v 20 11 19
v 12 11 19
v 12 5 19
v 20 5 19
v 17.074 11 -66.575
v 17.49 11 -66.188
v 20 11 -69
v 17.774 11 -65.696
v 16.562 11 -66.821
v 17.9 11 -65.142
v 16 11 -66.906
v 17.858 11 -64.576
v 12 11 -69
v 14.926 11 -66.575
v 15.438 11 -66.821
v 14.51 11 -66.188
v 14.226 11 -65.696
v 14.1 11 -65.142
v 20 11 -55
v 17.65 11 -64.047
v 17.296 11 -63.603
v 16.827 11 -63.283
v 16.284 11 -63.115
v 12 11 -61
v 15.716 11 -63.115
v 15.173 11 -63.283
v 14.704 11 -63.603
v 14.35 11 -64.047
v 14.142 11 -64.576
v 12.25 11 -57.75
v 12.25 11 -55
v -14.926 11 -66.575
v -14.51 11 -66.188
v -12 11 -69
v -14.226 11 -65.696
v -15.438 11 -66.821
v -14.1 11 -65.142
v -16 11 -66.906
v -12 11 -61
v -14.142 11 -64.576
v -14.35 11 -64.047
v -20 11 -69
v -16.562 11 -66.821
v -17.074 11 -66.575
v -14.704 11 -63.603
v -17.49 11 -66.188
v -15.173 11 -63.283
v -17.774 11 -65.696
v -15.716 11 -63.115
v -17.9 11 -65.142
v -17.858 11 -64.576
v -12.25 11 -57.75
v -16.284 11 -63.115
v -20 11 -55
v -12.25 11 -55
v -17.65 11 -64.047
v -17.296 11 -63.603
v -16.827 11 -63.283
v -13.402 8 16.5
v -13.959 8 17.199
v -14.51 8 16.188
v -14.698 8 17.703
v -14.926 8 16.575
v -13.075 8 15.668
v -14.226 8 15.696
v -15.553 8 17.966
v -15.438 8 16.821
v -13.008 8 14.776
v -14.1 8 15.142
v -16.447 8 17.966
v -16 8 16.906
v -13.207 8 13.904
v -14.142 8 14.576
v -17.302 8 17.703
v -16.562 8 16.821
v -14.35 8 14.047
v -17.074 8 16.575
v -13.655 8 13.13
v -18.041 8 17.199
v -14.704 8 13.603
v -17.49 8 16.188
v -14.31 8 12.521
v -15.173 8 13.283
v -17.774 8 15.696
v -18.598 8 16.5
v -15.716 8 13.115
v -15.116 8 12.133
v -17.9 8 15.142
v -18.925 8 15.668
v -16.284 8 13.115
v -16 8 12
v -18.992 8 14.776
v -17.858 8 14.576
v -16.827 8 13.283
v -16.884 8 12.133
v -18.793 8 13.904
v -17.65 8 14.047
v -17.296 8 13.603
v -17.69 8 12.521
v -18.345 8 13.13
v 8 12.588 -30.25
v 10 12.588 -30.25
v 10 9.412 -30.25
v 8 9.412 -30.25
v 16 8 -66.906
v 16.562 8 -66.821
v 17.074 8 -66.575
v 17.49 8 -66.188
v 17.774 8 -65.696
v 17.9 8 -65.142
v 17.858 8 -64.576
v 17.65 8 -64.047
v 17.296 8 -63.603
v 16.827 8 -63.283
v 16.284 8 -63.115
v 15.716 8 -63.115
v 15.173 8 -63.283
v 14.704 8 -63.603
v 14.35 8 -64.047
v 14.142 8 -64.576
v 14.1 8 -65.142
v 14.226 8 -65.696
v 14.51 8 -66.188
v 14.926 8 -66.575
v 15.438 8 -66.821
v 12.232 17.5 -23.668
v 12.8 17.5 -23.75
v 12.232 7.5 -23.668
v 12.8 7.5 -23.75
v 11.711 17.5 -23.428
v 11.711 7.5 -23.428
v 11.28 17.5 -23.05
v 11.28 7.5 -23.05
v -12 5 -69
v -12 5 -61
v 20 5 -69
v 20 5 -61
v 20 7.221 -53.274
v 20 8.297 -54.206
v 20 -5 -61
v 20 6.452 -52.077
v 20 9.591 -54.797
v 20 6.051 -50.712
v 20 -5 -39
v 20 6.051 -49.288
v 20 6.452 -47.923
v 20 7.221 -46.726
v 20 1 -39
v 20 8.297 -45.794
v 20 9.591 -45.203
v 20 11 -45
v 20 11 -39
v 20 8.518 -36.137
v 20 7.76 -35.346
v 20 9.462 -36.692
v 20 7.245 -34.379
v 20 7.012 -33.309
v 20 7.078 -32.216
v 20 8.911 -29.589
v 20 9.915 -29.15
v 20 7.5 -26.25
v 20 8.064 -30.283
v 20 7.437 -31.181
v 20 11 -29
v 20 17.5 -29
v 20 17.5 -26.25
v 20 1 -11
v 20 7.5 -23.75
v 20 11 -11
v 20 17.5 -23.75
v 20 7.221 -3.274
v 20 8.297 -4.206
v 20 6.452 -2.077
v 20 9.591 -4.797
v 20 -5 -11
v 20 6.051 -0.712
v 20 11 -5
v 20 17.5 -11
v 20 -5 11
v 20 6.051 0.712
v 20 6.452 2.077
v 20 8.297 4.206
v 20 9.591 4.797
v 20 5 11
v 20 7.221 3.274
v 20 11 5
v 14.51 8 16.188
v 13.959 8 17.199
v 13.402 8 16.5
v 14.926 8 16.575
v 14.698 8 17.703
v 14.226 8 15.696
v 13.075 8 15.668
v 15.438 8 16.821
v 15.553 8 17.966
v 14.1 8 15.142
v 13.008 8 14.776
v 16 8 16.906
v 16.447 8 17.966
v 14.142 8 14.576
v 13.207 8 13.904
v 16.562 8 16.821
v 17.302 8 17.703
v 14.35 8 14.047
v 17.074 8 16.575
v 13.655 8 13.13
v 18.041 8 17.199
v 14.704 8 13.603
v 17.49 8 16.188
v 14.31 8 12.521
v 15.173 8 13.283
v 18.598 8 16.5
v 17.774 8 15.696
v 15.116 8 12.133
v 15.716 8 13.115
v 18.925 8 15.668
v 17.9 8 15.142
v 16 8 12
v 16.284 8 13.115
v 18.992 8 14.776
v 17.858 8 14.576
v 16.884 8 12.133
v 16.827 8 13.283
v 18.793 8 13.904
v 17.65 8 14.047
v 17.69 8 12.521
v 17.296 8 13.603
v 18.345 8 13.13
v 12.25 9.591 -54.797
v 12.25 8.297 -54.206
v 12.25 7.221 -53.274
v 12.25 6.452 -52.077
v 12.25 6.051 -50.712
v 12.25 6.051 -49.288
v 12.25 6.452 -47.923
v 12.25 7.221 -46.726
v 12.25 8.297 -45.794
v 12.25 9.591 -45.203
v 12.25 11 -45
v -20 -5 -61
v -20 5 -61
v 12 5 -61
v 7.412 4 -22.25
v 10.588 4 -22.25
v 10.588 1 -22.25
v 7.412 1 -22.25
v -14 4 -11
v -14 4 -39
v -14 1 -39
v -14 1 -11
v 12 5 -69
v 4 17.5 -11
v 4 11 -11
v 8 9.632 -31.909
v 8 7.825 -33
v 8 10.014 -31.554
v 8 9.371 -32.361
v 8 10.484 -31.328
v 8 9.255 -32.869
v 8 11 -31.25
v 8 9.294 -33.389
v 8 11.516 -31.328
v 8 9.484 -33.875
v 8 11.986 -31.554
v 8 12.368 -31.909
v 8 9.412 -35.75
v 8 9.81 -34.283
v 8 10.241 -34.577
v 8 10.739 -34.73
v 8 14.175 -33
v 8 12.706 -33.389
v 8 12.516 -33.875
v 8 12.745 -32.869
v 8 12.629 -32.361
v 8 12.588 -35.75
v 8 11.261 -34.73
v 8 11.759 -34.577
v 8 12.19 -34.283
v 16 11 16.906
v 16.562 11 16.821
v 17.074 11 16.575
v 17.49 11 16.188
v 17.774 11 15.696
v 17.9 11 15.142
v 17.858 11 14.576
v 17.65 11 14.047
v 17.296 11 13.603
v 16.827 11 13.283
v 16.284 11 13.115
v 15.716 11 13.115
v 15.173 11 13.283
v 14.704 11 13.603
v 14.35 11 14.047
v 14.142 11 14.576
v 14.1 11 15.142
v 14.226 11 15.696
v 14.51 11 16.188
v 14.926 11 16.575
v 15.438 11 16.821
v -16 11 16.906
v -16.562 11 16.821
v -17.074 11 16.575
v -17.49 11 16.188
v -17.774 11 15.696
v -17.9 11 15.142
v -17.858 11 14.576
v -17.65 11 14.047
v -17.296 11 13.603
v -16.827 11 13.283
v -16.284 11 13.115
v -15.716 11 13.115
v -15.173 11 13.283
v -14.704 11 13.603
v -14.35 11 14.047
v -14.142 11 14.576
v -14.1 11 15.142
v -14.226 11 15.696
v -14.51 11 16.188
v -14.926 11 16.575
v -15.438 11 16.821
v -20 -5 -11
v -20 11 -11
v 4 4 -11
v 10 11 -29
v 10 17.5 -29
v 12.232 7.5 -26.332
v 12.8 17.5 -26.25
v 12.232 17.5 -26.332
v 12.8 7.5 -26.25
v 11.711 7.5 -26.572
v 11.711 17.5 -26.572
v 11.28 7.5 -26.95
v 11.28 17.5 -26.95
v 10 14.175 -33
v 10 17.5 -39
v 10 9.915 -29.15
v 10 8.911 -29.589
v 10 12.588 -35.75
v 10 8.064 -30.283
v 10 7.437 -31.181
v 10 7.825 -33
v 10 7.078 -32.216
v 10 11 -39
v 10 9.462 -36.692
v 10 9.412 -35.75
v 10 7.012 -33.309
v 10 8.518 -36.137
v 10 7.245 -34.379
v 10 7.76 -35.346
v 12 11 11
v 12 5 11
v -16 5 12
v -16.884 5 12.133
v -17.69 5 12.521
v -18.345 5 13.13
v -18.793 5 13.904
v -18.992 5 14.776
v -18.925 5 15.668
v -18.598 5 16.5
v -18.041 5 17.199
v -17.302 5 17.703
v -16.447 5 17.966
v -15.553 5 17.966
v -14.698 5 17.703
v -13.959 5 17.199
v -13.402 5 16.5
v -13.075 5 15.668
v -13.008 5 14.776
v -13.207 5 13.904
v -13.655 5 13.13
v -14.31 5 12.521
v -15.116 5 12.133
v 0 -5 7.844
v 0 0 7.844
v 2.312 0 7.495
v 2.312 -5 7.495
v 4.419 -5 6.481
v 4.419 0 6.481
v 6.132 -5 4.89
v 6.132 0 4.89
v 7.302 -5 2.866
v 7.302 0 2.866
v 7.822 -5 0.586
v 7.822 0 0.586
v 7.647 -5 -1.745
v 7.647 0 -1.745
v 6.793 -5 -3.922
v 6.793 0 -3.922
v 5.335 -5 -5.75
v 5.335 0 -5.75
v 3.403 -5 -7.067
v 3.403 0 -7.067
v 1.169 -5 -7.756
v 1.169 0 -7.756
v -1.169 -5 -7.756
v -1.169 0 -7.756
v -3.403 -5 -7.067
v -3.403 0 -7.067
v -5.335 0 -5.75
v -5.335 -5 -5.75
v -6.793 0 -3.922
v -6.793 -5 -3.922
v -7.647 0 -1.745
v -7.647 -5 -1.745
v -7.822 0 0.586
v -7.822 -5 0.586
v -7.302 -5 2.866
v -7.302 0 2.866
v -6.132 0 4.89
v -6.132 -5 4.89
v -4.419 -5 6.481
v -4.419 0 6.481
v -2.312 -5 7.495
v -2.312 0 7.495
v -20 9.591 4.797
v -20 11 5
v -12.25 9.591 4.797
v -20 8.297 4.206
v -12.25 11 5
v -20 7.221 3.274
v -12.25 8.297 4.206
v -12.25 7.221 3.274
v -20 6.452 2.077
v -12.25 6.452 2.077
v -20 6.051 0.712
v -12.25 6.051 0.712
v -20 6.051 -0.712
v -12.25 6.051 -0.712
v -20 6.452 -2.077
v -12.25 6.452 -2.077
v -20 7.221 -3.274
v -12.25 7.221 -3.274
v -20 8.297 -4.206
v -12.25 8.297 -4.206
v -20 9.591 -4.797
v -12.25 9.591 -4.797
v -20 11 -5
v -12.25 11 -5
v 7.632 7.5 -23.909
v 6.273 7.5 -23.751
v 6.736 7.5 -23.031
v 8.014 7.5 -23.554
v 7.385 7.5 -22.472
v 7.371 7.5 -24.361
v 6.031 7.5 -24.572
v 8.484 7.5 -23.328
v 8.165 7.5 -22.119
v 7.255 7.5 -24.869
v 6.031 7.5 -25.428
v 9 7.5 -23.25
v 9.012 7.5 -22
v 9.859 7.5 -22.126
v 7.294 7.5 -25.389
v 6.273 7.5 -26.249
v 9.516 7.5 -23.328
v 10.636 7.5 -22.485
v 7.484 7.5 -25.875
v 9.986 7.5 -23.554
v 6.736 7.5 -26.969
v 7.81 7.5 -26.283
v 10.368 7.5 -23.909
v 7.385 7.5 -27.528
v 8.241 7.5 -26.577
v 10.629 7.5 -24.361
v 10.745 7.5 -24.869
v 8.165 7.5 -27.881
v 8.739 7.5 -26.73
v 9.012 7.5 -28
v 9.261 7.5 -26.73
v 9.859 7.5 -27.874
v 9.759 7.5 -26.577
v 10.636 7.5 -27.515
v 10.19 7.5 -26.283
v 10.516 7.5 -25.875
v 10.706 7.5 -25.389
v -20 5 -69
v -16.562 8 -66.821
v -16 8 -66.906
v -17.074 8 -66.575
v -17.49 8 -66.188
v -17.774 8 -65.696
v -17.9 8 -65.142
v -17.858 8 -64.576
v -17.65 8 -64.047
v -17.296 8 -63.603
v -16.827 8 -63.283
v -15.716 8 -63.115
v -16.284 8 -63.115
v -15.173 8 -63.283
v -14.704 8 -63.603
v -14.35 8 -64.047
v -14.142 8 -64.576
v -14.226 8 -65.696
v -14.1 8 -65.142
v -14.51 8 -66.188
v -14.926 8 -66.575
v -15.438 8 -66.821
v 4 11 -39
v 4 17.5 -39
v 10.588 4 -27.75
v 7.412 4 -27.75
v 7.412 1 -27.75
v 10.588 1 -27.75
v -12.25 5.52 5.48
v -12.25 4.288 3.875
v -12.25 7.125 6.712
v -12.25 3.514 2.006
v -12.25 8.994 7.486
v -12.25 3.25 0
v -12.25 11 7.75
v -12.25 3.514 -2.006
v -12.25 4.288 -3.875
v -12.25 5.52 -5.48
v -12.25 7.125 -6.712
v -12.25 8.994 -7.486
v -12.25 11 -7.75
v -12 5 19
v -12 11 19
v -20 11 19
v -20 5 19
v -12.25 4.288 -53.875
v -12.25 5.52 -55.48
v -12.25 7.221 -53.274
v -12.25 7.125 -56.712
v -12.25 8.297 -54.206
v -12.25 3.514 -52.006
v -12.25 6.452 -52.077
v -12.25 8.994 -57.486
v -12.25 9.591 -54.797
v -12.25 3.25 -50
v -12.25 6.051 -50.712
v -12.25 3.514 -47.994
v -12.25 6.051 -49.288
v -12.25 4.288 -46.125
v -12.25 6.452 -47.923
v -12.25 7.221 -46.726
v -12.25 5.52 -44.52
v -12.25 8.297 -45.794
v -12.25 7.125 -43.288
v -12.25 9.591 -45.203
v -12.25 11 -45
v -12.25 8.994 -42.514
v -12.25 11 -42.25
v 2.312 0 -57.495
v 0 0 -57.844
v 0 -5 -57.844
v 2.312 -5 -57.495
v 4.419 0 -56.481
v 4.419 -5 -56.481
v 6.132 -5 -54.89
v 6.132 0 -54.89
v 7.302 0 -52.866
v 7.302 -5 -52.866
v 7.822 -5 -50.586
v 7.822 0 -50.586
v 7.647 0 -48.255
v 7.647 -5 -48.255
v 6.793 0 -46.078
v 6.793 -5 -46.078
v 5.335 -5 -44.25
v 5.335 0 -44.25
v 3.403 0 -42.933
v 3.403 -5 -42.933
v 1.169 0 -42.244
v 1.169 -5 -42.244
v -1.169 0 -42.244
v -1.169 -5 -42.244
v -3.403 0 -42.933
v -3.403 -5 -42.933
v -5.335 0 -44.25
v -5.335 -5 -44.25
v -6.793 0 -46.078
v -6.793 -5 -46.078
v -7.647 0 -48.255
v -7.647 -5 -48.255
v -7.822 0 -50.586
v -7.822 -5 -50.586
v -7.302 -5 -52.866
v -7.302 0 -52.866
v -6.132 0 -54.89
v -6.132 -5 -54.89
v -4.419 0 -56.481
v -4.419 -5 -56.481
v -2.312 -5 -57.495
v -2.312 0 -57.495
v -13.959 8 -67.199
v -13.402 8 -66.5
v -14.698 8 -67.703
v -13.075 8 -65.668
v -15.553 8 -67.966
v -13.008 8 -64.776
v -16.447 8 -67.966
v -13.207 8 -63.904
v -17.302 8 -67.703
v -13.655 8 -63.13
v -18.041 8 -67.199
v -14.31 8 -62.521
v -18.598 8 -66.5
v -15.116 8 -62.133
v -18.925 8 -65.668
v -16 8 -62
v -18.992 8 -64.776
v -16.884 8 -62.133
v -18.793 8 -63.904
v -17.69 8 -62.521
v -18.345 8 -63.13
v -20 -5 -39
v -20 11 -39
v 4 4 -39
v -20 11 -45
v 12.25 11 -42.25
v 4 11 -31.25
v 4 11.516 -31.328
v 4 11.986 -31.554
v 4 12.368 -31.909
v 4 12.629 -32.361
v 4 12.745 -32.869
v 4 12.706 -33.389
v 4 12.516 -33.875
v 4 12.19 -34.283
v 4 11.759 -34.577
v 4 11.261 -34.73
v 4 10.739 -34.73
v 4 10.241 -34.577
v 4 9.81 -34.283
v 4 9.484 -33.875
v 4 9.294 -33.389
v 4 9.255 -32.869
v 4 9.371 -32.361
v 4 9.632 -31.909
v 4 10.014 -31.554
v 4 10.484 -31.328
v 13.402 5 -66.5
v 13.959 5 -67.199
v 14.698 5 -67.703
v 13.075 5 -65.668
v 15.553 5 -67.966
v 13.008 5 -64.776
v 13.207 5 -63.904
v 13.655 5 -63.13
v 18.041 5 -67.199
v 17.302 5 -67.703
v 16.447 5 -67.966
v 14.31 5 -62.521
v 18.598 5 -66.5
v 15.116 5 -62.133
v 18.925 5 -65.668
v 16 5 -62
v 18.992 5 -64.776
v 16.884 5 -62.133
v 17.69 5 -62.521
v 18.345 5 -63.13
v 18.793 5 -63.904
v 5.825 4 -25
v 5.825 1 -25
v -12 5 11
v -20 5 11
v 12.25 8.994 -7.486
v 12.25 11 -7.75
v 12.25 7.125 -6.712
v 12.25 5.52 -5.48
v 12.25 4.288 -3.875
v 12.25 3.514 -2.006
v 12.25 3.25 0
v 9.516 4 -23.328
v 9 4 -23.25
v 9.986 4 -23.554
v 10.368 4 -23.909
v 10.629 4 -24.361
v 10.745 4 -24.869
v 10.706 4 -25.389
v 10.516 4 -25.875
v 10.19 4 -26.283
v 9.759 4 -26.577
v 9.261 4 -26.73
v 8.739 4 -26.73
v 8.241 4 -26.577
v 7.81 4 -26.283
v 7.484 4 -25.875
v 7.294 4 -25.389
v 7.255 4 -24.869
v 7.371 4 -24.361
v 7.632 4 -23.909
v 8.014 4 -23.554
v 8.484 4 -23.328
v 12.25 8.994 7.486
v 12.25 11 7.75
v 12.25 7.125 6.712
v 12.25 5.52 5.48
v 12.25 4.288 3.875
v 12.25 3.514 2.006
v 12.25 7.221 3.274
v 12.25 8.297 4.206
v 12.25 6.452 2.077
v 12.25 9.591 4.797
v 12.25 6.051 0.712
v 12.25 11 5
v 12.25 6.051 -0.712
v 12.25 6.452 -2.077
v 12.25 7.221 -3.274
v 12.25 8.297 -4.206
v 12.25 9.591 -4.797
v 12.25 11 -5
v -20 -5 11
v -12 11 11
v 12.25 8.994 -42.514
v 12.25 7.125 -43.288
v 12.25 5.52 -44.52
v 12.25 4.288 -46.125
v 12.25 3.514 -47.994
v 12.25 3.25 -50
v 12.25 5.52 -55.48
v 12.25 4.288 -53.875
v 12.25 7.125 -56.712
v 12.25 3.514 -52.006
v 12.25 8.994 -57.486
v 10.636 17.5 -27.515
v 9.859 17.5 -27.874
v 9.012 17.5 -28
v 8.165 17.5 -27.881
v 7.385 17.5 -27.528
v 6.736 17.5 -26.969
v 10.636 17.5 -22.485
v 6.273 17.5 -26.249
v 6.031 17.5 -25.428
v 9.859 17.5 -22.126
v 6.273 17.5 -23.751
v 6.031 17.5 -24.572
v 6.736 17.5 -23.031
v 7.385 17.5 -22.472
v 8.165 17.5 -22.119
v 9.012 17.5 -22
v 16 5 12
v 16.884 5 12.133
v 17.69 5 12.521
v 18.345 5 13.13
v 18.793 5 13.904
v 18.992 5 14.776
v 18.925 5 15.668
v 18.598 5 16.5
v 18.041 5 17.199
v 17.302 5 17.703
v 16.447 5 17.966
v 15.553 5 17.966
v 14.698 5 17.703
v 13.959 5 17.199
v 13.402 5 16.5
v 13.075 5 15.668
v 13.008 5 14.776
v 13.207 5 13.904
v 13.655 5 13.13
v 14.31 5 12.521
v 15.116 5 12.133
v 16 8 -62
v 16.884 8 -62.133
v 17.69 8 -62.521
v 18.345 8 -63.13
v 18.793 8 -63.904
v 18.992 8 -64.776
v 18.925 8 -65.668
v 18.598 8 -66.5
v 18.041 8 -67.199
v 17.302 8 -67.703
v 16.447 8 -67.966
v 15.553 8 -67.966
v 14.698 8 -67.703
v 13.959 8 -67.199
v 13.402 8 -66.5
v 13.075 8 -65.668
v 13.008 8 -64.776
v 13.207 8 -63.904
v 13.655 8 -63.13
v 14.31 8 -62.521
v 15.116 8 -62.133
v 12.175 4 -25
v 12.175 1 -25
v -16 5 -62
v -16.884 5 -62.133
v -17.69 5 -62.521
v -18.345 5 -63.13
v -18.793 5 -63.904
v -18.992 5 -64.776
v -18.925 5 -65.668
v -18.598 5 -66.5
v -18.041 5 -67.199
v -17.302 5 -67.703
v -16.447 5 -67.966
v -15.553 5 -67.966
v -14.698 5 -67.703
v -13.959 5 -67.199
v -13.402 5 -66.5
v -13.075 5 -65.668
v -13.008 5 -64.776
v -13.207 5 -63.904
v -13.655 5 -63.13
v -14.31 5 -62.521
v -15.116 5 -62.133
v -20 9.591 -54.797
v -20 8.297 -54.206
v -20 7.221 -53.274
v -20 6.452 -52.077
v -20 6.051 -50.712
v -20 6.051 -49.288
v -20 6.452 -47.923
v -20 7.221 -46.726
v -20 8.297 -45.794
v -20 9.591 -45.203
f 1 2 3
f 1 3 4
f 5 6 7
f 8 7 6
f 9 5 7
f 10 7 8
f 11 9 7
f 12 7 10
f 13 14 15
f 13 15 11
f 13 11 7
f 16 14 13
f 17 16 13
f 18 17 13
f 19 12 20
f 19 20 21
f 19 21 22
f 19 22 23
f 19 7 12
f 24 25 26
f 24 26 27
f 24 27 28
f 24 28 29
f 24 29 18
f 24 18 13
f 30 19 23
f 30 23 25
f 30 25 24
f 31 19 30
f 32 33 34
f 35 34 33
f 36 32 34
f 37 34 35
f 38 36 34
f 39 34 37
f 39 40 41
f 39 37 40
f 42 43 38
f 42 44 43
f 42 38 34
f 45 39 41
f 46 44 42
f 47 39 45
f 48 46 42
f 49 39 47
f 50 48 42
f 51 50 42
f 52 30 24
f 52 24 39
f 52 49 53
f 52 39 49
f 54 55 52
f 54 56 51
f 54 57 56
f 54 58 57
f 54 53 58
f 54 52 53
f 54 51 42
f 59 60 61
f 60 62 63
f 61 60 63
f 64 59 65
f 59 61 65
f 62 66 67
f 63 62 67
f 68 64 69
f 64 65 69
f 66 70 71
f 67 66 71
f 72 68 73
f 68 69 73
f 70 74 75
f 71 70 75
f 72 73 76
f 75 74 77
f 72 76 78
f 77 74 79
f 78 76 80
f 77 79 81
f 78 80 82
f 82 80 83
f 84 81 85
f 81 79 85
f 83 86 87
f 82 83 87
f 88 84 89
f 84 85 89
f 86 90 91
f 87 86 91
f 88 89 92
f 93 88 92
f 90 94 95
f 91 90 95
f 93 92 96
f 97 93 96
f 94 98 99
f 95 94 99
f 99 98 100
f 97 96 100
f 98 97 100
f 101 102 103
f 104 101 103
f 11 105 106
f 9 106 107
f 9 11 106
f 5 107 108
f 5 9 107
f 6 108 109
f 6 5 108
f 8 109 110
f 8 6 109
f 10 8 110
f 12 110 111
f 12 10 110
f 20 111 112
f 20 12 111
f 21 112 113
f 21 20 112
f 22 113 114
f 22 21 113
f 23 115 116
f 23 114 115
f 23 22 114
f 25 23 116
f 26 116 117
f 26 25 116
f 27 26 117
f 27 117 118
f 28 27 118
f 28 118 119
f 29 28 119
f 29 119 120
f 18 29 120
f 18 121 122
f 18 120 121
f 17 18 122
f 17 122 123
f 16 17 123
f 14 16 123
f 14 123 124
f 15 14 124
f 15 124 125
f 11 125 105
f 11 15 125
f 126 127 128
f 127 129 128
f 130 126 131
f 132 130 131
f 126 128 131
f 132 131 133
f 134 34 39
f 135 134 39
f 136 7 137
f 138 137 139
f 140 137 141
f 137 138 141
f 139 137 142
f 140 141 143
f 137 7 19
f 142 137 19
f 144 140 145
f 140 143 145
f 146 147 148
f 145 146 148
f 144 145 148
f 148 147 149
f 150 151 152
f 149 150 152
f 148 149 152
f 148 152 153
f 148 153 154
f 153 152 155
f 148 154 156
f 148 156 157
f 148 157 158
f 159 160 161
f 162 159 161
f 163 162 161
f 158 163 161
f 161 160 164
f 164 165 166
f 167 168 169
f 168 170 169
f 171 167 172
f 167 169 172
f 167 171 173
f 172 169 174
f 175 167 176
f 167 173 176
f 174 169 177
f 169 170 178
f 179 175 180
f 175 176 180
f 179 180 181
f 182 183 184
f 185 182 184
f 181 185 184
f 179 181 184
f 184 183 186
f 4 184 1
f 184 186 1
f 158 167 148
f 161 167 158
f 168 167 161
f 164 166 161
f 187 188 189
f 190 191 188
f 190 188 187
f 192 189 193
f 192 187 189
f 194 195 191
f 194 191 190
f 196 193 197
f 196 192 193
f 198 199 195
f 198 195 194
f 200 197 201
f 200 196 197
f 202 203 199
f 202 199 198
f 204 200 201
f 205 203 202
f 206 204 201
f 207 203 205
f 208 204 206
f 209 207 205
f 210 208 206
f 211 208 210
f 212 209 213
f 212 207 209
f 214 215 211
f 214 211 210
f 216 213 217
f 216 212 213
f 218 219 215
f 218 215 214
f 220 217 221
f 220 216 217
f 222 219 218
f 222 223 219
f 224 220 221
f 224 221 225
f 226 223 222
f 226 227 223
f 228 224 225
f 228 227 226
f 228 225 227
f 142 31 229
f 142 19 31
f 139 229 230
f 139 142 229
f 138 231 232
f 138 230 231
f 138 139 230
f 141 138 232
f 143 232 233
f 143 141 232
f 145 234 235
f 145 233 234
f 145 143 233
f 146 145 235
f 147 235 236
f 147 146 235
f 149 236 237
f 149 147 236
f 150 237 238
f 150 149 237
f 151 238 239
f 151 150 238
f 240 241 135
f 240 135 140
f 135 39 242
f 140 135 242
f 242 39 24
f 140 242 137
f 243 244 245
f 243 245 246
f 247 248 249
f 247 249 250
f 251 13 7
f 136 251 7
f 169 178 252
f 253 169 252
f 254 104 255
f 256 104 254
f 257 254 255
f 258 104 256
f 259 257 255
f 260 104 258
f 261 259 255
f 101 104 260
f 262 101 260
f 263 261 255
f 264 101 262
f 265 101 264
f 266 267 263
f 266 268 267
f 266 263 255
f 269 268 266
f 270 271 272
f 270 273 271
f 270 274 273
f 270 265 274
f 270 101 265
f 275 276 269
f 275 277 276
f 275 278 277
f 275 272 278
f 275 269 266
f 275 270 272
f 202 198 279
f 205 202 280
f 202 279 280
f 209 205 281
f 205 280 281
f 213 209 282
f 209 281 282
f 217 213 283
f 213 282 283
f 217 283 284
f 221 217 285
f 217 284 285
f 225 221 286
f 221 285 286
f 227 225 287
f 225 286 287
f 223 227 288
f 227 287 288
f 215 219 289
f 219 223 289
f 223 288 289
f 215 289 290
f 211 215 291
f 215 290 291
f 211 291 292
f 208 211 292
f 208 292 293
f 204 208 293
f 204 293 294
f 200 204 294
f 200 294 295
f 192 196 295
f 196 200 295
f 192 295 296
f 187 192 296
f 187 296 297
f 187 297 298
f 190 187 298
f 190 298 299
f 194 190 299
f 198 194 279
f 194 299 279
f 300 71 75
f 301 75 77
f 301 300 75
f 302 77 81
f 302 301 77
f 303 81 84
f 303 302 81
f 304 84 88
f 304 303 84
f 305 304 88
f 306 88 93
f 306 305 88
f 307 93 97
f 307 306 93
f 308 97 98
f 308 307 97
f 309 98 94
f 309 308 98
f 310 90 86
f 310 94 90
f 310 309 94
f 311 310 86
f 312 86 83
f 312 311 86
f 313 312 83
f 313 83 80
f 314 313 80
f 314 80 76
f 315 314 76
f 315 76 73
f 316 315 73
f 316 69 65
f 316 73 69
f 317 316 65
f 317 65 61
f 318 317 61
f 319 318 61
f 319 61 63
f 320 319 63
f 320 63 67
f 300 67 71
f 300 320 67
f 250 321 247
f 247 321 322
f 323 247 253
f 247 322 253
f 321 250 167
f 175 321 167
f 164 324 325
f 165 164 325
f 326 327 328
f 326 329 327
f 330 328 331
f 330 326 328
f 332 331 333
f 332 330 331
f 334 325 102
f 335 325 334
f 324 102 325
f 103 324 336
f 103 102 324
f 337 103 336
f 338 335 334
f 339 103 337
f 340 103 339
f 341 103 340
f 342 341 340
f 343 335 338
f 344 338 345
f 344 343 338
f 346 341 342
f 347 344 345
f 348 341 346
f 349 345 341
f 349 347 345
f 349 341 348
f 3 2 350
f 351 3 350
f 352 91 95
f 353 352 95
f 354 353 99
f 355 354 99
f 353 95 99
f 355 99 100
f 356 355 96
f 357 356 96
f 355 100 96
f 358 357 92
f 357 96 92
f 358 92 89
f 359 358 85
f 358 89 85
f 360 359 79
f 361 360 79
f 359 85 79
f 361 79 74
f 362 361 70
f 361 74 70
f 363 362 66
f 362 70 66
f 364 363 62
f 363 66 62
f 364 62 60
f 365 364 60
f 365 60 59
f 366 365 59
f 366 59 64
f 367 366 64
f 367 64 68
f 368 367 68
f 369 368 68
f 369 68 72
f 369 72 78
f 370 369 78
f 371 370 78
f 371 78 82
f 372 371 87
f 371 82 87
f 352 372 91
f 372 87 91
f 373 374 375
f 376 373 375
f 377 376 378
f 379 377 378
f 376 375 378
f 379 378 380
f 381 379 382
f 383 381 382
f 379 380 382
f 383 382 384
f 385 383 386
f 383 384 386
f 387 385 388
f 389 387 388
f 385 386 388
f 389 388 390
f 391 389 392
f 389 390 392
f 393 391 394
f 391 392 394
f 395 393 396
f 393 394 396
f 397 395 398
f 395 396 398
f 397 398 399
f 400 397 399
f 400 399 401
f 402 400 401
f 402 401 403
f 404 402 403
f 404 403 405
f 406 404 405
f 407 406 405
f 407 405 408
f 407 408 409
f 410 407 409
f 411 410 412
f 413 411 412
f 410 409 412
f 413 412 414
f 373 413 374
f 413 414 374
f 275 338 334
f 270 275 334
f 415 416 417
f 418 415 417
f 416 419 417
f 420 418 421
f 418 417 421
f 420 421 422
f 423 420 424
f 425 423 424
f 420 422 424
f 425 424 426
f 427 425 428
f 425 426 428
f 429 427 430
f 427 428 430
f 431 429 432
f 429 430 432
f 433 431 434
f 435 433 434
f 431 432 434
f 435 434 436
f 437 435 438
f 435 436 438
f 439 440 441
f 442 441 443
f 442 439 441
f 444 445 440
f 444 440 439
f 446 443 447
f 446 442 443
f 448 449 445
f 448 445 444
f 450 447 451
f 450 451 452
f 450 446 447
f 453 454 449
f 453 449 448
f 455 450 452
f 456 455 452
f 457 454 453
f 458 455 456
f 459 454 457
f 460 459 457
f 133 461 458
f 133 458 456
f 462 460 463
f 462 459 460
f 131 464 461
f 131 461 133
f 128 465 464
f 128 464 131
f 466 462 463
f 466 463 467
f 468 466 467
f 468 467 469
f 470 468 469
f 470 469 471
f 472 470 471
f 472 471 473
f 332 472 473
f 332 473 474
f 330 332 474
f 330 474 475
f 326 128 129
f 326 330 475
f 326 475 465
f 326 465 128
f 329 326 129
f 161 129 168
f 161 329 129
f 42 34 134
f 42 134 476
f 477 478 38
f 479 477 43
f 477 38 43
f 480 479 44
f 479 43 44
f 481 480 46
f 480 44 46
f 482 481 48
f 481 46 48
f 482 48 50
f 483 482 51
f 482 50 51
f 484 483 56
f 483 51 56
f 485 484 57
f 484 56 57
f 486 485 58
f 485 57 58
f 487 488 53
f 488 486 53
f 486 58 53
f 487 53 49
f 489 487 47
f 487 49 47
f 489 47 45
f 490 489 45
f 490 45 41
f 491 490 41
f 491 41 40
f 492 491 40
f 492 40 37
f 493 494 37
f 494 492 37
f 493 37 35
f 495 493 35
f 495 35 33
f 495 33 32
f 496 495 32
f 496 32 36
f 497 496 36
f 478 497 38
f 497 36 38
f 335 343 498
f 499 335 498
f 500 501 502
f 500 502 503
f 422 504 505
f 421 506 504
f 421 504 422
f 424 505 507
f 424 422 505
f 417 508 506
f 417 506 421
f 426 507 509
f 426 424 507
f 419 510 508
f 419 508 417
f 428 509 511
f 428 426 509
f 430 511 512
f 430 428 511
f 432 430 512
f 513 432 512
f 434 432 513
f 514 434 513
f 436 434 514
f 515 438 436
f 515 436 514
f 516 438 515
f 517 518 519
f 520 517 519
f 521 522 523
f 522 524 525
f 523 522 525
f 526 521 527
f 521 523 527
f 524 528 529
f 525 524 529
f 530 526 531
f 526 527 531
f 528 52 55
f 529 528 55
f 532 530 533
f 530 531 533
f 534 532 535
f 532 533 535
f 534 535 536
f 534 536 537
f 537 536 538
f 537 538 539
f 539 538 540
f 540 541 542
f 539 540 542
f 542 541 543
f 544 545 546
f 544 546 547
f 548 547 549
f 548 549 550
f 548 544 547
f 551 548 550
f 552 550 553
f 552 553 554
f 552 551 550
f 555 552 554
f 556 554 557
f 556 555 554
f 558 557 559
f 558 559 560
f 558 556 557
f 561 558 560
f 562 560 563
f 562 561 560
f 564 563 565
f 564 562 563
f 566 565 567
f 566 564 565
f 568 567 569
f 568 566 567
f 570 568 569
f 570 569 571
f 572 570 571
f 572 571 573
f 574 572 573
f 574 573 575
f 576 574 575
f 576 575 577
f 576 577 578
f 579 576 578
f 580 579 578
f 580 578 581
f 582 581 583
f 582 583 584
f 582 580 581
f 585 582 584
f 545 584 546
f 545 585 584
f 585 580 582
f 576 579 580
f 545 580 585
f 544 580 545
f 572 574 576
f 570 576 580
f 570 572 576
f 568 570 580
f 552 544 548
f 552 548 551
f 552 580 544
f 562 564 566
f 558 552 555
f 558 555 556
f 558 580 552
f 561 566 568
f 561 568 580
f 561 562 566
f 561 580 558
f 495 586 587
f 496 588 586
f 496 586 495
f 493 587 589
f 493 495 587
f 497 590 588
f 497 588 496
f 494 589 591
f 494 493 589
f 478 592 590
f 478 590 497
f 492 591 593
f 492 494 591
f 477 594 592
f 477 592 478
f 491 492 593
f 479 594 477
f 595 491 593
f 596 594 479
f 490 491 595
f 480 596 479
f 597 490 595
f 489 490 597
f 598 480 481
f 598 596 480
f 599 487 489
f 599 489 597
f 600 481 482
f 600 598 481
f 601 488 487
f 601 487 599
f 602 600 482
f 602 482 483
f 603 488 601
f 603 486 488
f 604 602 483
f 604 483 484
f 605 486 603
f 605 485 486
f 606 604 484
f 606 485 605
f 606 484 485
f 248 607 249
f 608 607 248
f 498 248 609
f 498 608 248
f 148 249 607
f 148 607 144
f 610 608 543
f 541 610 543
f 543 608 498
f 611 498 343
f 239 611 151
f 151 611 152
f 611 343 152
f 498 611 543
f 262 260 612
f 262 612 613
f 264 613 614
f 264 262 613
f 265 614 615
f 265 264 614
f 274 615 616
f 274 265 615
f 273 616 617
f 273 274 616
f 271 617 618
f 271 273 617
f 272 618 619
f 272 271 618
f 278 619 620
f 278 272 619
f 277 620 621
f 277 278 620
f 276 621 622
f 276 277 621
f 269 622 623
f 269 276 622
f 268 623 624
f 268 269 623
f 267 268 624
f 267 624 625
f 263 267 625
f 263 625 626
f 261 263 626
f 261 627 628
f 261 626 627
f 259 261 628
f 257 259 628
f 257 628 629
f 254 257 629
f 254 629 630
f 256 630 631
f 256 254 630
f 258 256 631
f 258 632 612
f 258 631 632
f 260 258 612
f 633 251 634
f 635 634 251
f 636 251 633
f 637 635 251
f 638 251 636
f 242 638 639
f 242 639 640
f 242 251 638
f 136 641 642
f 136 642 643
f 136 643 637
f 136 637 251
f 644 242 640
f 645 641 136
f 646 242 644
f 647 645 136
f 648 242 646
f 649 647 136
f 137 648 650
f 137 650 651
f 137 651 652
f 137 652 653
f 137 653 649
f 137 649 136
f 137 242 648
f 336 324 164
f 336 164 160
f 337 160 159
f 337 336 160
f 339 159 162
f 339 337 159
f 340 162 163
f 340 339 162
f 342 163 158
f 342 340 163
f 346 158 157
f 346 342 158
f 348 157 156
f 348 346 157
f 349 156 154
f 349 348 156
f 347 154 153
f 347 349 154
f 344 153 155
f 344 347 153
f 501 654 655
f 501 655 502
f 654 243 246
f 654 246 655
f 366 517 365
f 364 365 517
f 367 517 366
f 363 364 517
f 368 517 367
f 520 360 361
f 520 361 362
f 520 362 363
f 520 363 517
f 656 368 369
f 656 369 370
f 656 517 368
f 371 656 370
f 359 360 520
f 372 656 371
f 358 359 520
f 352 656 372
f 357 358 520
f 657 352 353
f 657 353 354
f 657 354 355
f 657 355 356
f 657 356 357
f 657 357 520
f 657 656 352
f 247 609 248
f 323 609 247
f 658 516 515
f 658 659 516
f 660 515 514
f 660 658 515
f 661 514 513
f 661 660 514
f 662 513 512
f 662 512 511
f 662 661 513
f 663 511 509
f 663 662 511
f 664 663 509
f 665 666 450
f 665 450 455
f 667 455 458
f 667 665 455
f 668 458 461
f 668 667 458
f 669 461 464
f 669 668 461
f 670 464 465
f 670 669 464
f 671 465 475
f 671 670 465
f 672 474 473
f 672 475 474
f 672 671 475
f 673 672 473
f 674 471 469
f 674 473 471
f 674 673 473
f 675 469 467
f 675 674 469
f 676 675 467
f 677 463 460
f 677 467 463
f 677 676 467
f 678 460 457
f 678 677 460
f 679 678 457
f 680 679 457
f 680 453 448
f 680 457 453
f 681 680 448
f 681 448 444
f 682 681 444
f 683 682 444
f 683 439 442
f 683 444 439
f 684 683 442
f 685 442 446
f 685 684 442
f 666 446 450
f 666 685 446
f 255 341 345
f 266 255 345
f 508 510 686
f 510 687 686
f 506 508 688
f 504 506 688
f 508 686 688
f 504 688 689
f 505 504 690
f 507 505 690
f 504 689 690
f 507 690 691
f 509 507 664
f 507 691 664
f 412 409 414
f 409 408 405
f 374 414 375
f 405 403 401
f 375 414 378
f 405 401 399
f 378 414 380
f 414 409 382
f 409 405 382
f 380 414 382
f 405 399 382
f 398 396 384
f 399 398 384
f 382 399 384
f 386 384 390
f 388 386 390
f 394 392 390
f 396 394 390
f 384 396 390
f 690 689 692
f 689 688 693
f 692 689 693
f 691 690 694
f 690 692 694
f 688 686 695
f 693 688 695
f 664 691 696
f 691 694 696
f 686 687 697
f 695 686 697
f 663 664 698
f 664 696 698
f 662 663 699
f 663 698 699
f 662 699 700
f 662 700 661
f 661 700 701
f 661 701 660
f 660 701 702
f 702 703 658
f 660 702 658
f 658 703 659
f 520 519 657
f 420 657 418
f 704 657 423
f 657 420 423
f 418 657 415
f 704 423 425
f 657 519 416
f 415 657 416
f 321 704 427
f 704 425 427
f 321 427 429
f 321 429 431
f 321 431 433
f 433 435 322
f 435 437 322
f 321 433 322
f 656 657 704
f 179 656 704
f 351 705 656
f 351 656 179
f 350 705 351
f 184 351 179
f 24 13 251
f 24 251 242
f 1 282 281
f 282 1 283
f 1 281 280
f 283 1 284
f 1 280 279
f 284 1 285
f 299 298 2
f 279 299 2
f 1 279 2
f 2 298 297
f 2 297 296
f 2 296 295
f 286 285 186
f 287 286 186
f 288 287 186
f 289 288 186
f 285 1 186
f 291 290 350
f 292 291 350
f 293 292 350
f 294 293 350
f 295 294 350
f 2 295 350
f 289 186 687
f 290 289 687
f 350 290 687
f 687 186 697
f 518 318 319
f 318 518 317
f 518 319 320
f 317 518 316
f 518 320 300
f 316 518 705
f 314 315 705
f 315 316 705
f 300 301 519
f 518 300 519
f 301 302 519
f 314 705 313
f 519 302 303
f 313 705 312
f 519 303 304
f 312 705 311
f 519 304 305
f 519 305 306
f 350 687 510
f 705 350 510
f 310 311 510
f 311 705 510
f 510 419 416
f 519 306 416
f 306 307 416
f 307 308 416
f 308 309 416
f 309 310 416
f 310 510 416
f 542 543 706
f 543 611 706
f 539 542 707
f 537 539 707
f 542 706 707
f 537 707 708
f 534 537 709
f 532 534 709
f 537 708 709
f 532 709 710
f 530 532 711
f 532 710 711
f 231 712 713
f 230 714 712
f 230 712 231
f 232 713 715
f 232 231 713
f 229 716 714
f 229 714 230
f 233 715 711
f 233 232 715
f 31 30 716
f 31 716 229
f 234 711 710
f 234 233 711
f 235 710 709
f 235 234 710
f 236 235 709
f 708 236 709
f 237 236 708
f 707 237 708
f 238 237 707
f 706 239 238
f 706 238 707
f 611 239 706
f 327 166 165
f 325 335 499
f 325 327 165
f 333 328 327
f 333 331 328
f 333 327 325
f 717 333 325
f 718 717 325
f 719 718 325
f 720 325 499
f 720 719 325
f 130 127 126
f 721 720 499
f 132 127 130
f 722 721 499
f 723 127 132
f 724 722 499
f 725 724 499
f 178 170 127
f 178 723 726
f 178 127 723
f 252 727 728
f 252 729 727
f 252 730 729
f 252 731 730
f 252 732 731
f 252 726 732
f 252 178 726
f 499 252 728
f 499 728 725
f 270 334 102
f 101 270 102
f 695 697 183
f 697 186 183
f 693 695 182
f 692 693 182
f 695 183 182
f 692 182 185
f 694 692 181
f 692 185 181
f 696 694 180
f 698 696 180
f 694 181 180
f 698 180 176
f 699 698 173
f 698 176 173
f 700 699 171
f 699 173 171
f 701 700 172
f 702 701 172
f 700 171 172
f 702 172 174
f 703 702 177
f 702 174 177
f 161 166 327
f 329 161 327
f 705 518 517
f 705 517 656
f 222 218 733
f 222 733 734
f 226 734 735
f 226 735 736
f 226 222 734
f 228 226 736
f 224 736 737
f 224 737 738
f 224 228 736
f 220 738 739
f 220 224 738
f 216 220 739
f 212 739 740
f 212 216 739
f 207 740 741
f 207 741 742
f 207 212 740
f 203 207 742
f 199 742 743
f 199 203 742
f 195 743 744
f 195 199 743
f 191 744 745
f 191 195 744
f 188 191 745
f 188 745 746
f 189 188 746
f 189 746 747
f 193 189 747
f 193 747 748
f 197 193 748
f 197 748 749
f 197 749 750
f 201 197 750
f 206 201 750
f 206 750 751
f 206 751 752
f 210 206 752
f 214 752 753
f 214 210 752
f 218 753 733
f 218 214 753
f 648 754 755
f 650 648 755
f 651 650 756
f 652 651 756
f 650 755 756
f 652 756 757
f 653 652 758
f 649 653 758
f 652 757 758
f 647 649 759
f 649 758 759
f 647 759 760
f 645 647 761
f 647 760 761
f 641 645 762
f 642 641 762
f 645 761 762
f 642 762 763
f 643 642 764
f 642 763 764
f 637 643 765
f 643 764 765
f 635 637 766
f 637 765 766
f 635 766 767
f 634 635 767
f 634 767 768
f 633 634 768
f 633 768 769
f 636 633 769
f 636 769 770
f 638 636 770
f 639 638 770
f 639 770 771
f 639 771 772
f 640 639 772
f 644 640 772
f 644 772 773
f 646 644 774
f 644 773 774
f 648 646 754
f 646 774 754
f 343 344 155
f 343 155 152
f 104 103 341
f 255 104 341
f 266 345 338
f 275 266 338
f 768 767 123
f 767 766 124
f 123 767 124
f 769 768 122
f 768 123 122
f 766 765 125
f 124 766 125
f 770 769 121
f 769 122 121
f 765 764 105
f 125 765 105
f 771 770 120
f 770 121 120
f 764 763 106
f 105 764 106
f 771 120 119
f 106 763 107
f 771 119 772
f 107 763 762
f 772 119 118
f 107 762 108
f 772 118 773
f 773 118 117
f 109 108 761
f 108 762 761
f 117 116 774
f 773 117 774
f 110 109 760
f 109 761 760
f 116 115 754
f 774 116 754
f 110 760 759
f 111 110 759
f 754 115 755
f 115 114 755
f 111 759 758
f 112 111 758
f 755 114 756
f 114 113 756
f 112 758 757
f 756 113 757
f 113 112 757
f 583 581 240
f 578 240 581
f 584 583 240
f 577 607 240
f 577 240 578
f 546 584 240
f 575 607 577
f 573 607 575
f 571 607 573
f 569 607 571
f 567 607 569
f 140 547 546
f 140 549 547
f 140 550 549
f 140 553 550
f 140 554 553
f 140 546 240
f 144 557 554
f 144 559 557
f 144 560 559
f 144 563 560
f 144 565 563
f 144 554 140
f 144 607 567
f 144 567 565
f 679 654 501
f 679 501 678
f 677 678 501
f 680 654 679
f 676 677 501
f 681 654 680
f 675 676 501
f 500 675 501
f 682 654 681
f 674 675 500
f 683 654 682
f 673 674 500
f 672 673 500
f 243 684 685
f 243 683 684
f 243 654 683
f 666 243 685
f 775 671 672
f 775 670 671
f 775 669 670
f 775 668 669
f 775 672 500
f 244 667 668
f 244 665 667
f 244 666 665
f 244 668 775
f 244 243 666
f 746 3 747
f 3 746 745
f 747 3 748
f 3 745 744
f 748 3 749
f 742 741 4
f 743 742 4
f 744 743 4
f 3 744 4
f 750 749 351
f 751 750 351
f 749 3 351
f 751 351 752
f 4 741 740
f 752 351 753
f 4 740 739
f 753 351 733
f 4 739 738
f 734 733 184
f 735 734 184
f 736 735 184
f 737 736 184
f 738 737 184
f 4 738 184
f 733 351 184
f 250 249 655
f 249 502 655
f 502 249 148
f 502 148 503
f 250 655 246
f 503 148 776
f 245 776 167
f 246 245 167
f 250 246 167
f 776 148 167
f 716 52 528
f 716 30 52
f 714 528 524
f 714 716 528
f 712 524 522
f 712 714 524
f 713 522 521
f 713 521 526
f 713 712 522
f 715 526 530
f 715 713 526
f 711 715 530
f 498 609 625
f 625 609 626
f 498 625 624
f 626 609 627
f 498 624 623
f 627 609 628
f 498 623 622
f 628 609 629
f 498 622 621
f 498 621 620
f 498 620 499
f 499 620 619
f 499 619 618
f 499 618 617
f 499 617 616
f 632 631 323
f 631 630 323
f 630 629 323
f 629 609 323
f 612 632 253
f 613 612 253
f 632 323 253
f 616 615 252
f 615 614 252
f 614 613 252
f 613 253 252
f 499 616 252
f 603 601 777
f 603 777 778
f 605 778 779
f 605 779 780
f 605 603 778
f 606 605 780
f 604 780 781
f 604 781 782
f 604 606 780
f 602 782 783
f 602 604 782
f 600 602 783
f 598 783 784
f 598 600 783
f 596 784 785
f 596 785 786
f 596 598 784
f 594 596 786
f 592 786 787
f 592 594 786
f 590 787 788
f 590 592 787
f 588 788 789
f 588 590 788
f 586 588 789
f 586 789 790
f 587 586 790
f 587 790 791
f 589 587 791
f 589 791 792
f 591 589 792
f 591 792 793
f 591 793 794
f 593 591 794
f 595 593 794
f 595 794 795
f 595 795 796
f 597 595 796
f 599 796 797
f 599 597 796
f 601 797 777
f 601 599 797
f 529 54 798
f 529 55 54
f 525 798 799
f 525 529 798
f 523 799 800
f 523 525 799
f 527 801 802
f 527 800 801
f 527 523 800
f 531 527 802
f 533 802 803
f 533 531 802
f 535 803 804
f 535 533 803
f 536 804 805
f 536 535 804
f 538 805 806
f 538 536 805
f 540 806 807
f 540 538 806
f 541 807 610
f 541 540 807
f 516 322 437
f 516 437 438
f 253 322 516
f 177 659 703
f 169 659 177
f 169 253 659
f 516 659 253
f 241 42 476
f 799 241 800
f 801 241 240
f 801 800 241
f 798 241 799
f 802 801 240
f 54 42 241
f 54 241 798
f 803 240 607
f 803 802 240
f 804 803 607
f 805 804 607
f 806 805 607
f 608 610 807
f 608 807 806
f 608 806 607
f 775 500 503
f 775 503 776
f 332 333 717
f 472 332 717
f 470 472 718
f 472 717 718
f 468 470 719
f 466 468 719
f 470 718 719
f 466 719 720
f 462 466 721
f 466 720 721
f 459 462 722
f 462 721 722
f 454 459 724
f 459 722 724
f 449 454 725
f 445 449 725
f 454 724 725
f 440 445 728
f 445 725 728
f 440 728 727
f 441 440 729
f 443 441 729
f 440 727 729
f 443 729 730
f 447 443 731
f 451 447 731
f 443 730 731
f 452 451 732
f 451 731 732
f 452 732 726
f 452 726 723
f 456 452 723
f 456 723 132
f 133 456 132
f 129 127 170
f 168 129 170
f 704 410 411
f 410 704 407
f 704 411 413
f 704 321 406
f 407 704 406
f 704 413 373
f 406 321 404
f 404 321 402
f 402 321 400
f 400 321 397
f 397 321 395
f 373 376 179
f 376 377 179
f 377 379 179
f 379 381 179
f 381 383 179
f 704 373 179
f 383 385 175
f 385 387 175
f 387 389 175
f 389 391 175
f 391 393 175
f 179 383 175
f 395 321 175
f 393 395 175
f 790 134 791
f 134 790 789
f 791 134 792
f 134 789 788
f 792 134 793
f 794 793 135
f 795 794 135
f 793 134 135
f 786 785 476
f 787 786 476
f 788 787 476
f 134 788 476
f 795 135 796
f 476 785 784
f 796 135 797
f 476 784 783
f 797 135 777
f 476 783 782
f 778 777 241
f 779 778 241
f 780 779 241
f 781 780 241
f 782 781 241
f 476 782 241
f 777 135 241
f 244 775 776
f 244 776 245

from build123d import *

# Parameters (mm, degrees)
SKETCH1_W                  = 40
SKETCH1_H                  = 22
BOSS_EXTRUDE1_DEPTH        = 11
SKETCH2_W                  = 40
SKETCH2_H                  = 22
SKETCH2_R                  = 7.843750423
BOSS_EXTRUDE2_DEPTH        = 5
SKETCH3_W                  = 24.5
SKETCH3_H                  = 15.5
CUT_EXTRUDE1_DEPTH         = 7.75
FILLET1_R                  = 7.75
SKETCH4_R                  = 5
CUT_EXTRUDE2_DEPTH         = 36.805900352
SKETCH5_W                  = 8
SKETCH5_H                  = 8
SKETCH5_R                  = 1.905800151
BOSS_EXTRUDE3_DEPTH        = 6
CUT_EXTRUDE3_START         = -3
SKETCH6_R                  = 3
SKETCH6_R_2                = 1.905800151
CUT_EXTRUDE3_DEPTH         = 3
SKETCH7_W                  = 16
SKETCH7_H                  = 16.5
BOSS_EXTRUDE5_DEPTH        = 28
MIRROR14_COPY_1_SKETCH_W   = 8
MIRROR14_COPY_1_SKETCH_H   = 8
MIRROR14_COPY_1_SKETCH_R   = 1.905800151
MIRROR14_COPY_1_DEPTH      = 6
MIRROR14_START             = -3
MIRROR14_COPY_2_SKETCH_R   = 3
MIRROR14_COPY_2_SKETCH_R_2 = 1.905800151
MIRROR14_COPY_2_DEPTH      = 3
FILLET1_OF_MIRROR14_R      = 7.75
SKETCH9_W                  = 28
SKETCH9_H                  = 3
BOSS_EXTRUDE6_DEPTH        = 18
CUT_EXTRUDE4_DEPTH         = 10
CUT_EXTRUDE5_DEPTH         = 73.919476136
CUT_EXTRUDE5_DEPTH_BACK    = 73.919476136
SKETCH11_R                 = 1.75
CUT_EXTRUDE6_DEPTH         = 76.121568141
CUT_EXTRUDE6_DEPTH_BACK    = 76.121568141
SKETCH12_R                 = 1.75
CUT_EXTRUDE9_DEPTH         = 12
CUT_EXTRUDE11_START        = -10
SKETCH16_R                 = 4
SKETCH16_R_2               = 1.75
SKETCH16_W                 = 10
SKETCH16_H                 = 6.5
CUT_EXTRUDE11_DEPTH        = 10
FILLET2_R                  = 2
CUT_EXTRUDE12_START        = -3
SKETCH17_R                 = 1.75
CUT_EXTRUDE12_DEPTH        = 3


# Some blends are built 0.0001 mm under size
with BuildPart() as part:
    # Sketch1 → Boss-Extrude1 (new body)
    with BuildSketch(Plane(origin=(0, 0, 0), x_dir=(1, 0, 0), z_dir=(0, 1, 0))):
        Rectangle(SKETCH1_W, SKETCH1_H)
    boss_extrude1 = extrude(amount=BOSS_EXTRUDE1_DEPTH)

    # Sketch2 → Boss-Extrude2 (add)
    with BuildSketch(Plane(origin=(0, 0, 0), x_dir=(1, 0, 0), z_dir=(0, 1, 0))):
        Rectangle(SKETCH2_W, SKETCH2_H)
        with Locations(Location((0, 0, 0), (0, 0, 270))):
            Circle(SKETCH2_R, mode=Mode.SUBTRACT)
    boss_extrude2 = extrude(amount=-BOSS_EXTRUDE2_DEPTH)

    # Sketch3 → Cut-Extrude1 (cut)
    with BuildSketch(Plane(origin=(0, 11, 0), x_dir=(1, 0, 0), z_dir=(0, 1, 0))):
        Rectangle(SKETCH3_W, SKETCH3_H)
    cut_extrude1 = extrude(amount=-CUT_EXTRUDE1_DEPTH, mode=Mode.SUBTRACT)

    # Fillet1
    fillet1_edges = [part.edges().sort_by_distance(p)[0] for p in [
        (0, 3.25, 7.75),
        (0, 3.25, -7.75),
    ]]
    fillet(fillet1_edges, radius=FILLET1_R - 0.0001)  # a hair under: the kernel refuses the full size

    # Sketch4 → Cut-Extrude2 (cut, symmetric)
    with BuildSketch(Plane(origin=(-12.25, 0, 0), x_dir=(0, 0, -1), z_dir=(1, 0, 0))):
        with Locations((0, 11)):
            Circle(SKETCH4_R)
    cut_extrude2 = extrude(amount=CUT_EXTRUDE2_DEPTH, both=True, mode=Mode.SUBTRACT)

    # Sketch5 → Boss-Extrude3 (add)
    with BuildSketch(Plane(origin=(0, 11, 0), x_dir=(1, 0, 0), z_dir=(0, 1, 0))):
        with Locations((16, -15)):
            Rectangle(SKETCH5_W, SKETCH5_H)
        with Locations(Location((16, -15, 0), (0, 0, 270))):
            Circle(SKETCH5_R, mode=Mode.SUBTRACT)
    boss_extrude3 = extrude(amount=-BOSS_EXTRUDE3_DEPTH)

    # Sketch6 → Cut-Extrude3 (cut)
    with BuildSketch(Plane.XZ.offset(-5).offset(CUT_EXTRUDE3_START)):
        with Locations(Location((16, 15, 0), (0, 0, 270))):
            Circle(SKETCH6_R)
        with Locations(Location((16, 15, 0), (0, 0, 90))):
            Circle(SKETCH6_R_2, mode=Mode.SUBTRACT)
    cut_extrude3 = extrude(amount=CUT_EXTRUDE3_DEPTH, mode=Mode.SUBTRACT)

    # Mirror8: Boss-Extrude3, Cut-Extrude3 across plane
    add(boss_extrude3.mirror(Plane(origin=(0, 0, 0), x_dir=(0, 0, 1), z_dir=(1, 0, 0))))
    add(cut_extrude3.mirror(Plane(origin=(0, 0, 0), x_dir=(0, 0, 1), z_dir=(1, 0, 0))), mode=Mode.SUBTRACT)

    # Sketch7 → Boss-Extrude5 (add)
    with BuildSketch(Plane(origin=(0, 0, -11), x_dir=(-1, 0, 0), z_dir=(0, 0, -1))):
        with Locations((-12, 9.25)):
            Rectangle(SKETCH7_W, SKETCH7_H)
    extrude(amount=BOSS_EXTRUDE5_DEPTH)

    # Mirror14: Boss-Extrude1, Boss-Extrude2, Cut-Extrude1, Cut-Extrude2, Boss-Extrude3, Cut-Extrude3 across plane
    add(boss_extrude1.mirror(Plane.XY.offset(-25)))
    add(boss_extrude2.mirror(Plane.XY.offset(-25)))
    add(cut_extrude1.mirror(Plane.XY.offset(-25)), mode=Mode.SUBTRACT)
    add(cut_extrude2.mirror(Plane.XY.offset(-25)), mode=Mode.SUBTRACT)
    add(boss_extrude3.mirror(Plane.XY.offset(-25)))
    add(cut_extrude3.mirror(Plane.XY.offset(-25)), mode=Mode.SUBTRACT)

    # Mirror14 copy 1 sketch → Mirror14 copy 1 (add)
    with BuildSketch(Plane(origin=(0, 11, -50), x_dir=(-1, 0, 0), z_dir=(0, 1, 0))):
        with Locations((16, -15)):
            Rectangle(MIRROR14_COPY_1_SKETCH_W, MIRROR14_COPY_1_SKETCH_H)
        with Locations(Location((16, -15, 0), (0, 0, 270))):
            Circle(MIRROR14_COPY_1_SKETCH_R, mode=Mode.SUBTRACT)
    extrude(amount=-MIRROR14_COPY_1_DEPTH)

    # Mirror14 copy 2 sketch → Mirror14 copy 2 (cut)
    with BuildSketch(Plane(origin=(0, 5, -50), x_dir=(-1, 0, 0), z_dir=(0, -1, 0)).offset(MIRROR14_START)):
        with Locations(Location((16, 15, 0), (0, 0, 270))):
            Circle(MIRROR14_COPY_2_SKETCH_R)
        with Locations(Location((16, 15, 0), (0, 0, 90))):
            Circle(MIRROR14_COPY_2_SKETCH_R_2, mode=Mode.SUBTRACT)
    extrude(amount=MIRROR14_COPY_2_DEPTH, mode=Mode.SUBTRACT)

    # Fillet1 of Mirror14
    fillet1_of_mirror14_edges = [part.edges().sort_by_distance(p)[0] for p in [
        (0, 3.25, -57.75),
        (0, 3.25, -42.25),
    ]]
    fillet(fillet1_of_mirror14_edges, radius=FILLET1_OF_MIRROR14_R - 0.0001)  # a hair under: the kernel refuses the full size

    # Sketch9 → Boss-Extrude6 (add)
    with BuildSketch(Plane.ZY.offset(-4)):
        with Locations((-25, 2.5)):
            Rectangle(SKETCH9_W, SKETCH9_H)
    extrude(amount=BOSS_EXTRUDE6_DEPTH)

    # Sketch10 → Cut-Extrude4 (cut)
    with BuildSketch(Plane(origin=(0, 17.5, 0), x_dir=(1, 0, 0), z_dir=(0, 1, 0))):
        with BuildLine():
            Line((9, 26.25), (9, 23.75))
            Line((9, 23.75), (11.727178029, 23.75))
            ThreePointArc((11.727178029, 23.75), (11.931001031, 24.360286817), (12, 25))
            ThreePointArc((12, 25), (11.931001031, 25.639713183), (11.727178029, 26.25))
            Line((11.727178029, 26.25), (9, 26.25))
        make_face()
        with BuildLine():
            Line((11.727178029, 23.75), (9, 23.75))
            Line((9, 23.75), (9, 26.25))
            Line((9, 26.25), (11.727178029, 26.25))
            ThreePointArc((11.727178029, 26.25), (6, 25), (11.727178029, 23.75))
        make_face()
        with BuildLine():
            ThreePointArc((12, 25), (11.931001031, 24.360286817), (11.727178029, 23.75))
            Line((11.727178029, 23.75), (20, 23.75))
            Line((20, 23.75), (20, 26.25))
            Line((20, 26.25), (11.727178029, 26.25))
            ThreePointArc((11.727178029, 26.25), (11.931001031, 25.639713183), (12, 25))
        make_face()
    extrude(amount=-CUT_EXTRUDE4_DEPTH, mode=Mode.SUBTRACT)

    # Sketch11 → Cut-Extrude5 (cut, two sides: drawn at the far end of the back side and taken through both)
    with BuildSketch(Plane(origin=(0, 7.5, 0), x_dir=(1, 0, 0), z_dir=(0, 1, 0)).offset(-CUT_EXTRUDE5_DEPTH_BACK)):
        with Locations(Location((9, 25, 0), (0, 0, 270))):
            Circle(SKETCH11_R)
    extrude(amount=CUT_EXTRUDE5_DEPTH + CUT_EXTRUDE5_DEPTH_BACK, mode=Mode.SUBTRACT)

    # Sketch12 → Cut-Extrude6 (cut, two sides: drawn at the far end of the back side and taken through both)
    with BuildSketch(Plane.ZY.offset(-4).offset(-CUT_EXTRUDE6_DEPTH_BACK)):
        with Locations((-33, 11)):
            Circle(SKETCH12_R)
    extrude(amount=CUT_EXTRUDE6_DEPTH + CUT_EXTRUDE6_DEPTH_BACK, mode=Mode.SUBTRACT)

    # Sketch15 → Cut-Extrude9 (cut)
    with BuildSketch(Plane(origin=(20, 0, 0), x_dir=(0, 0, -1), z_dir=(1, 0, 0))):
        Polygon((33, 14.175426481), (30.25, 12.58771324), (30.25, 9.41228676), (33, 7.824573519), (35.75, 9.41228676), (35.75, 12.58771324), align=None)
    extrude(amount=-CUT_EXTRUDE9_DEPTH, mode=Mode.SUBTRACT)

    # Sketch16 → Cut-Extrude11 (cut)
    # profile 1 of 2: a face of its own
    with BuildSketch(Plane(origin=(20, 0, 0), x_dir=(0, 0, -1), z_dir=(1, 0, 0)).offset(CUT_EXTRUDE11_START)):
        with Locations((33, 11)):
            Circle(SKETCH16_R)
        with Locations((33, 11)):
            Circle(SKETCH16_R_2, mode=Mode.SUBTRACT)
    # profile 2 of 2: a face of its own
    with BuildSketch(Plane(origin=(20, 0, 0), x_dir=(0, 0, -1), z_dir=(1, 0, 0)).offset(CUT_EXTRUDE11_START)):
        with Locations((34, 14.25)):
            Rectangle(SKETCH16_W, SKETCH16_H)
    extrude(amount=CUT_EXTRUDE11_DEPTH, mode=Mode.SUBTRACT)

    # Chamfer3
    # the kernel refuses this chamfer: 2.5 mm, written as the material it takes off along each edge
    with BuildSketch(Plane(origin=(4.790141486, 11, -37), x_dir=(0, -0.9712202897009368, 0.23818301550116588), z_dir=(1, 0, 0))) as chamfer3_piece_1_section:
        with BuildLine():
            Line((1.641163776, 0), (-0.550057664, 2.010038976))
            Line((-0.550057664, 2.010038976), (-0.598618679, 1.998129825))
            ThreePointArc((-0.598618679, 1.998129825), (-0.296653042, 0.999716345), (-0.048561014, -0.011909151))
            Line((-0.048561014, -0.011909151), (0.011909151, -0.048561014))
            ThreePointArc((0.011909151, -0.048561014), (0.818444442, 0.062835502), (1.633479525, -0.049405994))
            Line((1.633479525, -0.049405994), (1.641163776, 0))
        make_face()
    chamfer3_piece_1 = extrude(amount=20.419717028, mode=Mode.PRIVATE)
    chamfer3_piece_1 = split(chamfer3_piece_1, bisect_by=Plane(origin=(10, 11.063270064, -39.03704072), z_dir=(-1, 0, 0)), keep=Keep.TOP, mode=Mode.PRIVATE)
    chamfer3_piece_1 = split(chamfer3_piece_1, bisect_by=Plane(origin=(7.395070743, 11.063270064, -39), z_dir=(0, 0, -1)), keep=Keep.TOP, mode=Mode.PRIVATE)
    add(chamfer3_piece_1, mode=Mode.SUBTRACT)
    with BuildSketch(Plane(origin=(10, 11, -37), x_dir=(0, -0.9712202897009377, 0.23818301550116178), z_dir=(1, 0, 0))) as chamfer3_piece_2_section:
        with BuildLine():
            Line((1.641163776, 0), (-0.550057664, 2.010038976))
            Line((-0.550057664, 2.010038976), (-0.598618679, 1.998129825))
            ThreePointArc((-0.598618679, 1.998129825), (-0.296653042, 0.999716345), (-0.048561014, -0.011909151))
            Line((-0.048561014, -0.011909151), (0.011909151, -0.048561014))
            ThreePointArc((0.011909151, -0.048561014), (0.818444442, 0.062835502), (1.633479525, -0.049405994))
            Line((1.633479525, -0.049405994), (1.641163776, 0))
        make_face()
    chamfer3_piece_2 = extrude(amount=15.209858514, mode=Mode.PRIVATE)
    chamfer3_piece_2 = split(chamfer3_piece_2, bisect_by=Plane(origin=(17.604929257, 10.514615405, -39), z_dir=(0, 0, 1)), keep=Keep.TOP, mode=Mode.PRIVATE)
    add(chamfer3_piece_2, mode=Mode.SUBTRACT)
    with BuildSketch(Plane(origin=(10, 11, -37), x_dir=(0, -0.9712202897009377, 0.23818301550116178), z_dir=(1, 0, 0))) as chamfer3_piece_3_section:
        with BuildLine():
            Line((1.641163776, 0), (-0.550057664, 2.010038976))
            Line((-0.550057664, 2.010038976), (-0.598618679, 1.998129825))
            ThreePointArc((-0.598618679, 1.998129825), (-0.296653042, 0.999716345), (-0.048561014, -0.011909151))
            Line((-0.048561014, -0.011909151), (0.011909151, -0.048561014))
            ThreePointArc((0.011909151, -0.048561014), (0.818444442, 0.062835502), (1.633479525, -0.049405994))
            Line((1.633479525, -0.049405994), (1.641163776, 0))
        make_face()
    chamfer3_piece_3 = extrude(amount=15.209858514, mode=Mode.PRIVATE)
    chamfer3_piece_3 = split(chamfer3_piece_3, bisect_by=Plane(origin=(17.604929257, 11.063270064, -39), z_dir=(0, 0, -1)), keep=Keep.TOP, mode=Mode.PRIVATE)
    add(chamfer3_piece_3, mode=Mode.SUBTRACT)

    # Fillet2
    fillet2_edges = [part.edges().sort_by_distance(p)[0] for p in [
        (11.727178029, 12.5, -23.75),
        (11.727178029, 12.5, -26.25),
    ]]
    fillet(fillet2_edges, radius=FILLET2_R)

    # Sketch17 → Cut-Extrude12 (cut)
    with BuildSketch(Plane.XZ.offset(-1).offset(CUT_EXTRUDE12_START)):
        Polygon((12.175426481, -25), (10.58771324, -22.25), (7.41228676, -22.25), (5.824573519, -25), (7.41228676, -27.75), (10.58771324, -27.75), align=None)
        with Locations(Location((9, -25, 0), (0, 0, 90))):
            Circle(SKETCH17_R, mode=Mode.SUBTRACT)
    extrude(amount=CUT_EXTRUDE12_DEPTH, mode=Mode.SUBTRACT)


solid = part.part
